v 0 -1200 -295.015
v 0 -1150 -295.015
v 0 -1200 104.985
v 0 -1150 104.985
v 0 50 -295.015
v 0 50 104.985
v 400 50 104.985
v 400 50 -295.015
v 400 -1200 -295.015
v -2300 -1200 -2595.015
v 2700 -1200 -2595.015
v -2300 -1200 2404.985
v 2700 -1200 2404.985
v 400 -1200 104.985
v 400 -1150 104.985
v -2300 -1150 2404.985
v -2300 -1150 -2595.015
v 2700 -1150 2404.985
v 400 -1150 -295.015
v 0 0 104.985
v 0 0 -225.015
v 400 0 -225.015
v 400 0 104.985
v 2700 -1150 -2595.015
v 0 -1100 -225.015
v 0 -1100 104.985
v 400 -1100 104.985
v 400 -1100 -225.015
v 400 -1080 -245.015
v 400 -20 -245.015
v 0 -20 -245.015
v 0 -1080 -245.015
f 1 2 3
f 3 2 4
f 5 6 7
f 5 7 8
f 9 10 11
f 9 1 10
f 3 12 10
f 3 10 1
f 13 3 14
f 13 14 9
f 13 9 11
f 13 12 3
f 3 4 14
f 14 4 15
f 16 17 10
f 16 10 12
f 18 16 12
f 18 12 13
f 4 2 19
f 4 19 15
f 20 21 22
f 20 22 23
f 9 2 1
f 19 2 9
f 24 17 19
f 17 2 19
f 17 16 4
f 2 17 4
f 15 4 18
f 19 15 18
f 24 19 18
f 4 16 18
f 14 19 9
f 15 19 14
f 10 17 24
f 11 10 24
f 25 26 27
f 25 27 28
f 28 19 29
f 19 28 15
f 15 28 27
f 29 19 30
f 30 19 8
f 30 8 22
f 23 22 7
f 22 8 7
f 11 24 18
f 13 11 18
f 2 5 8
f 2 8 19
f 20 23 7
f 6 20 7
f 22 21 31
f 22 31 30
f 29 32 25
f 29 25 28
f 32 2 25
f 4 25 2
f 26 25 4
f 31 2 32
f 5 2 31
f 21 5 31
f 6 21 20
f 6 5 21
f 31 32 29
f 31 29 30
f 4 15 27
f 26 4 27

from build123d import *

# Parameters (mm, degrees)
BOSS_EXTRUDE1_DEPTH = 400
CHAMFER1_SIZE       = 20
SKETCH2_W           = 5000
SKETCH2_H           = 5000
SKETCH2_W_2         = 400
SKETCH2_H_2         = 400
BOSS_EXTRUDE2_DEPTH = 50


with BuildPart() as part:
    # Sketch1 → Boss-Extrude1 (new body)
    with BuildSketch(Plane(origin=(0, 0, 0), x_dir=(0, 0, -1), z_dir=(1, 0, 0))):
        Polygon((-104.985169381, 50), (295.014830619, 50), (295.014830619, -1150), (-104.985169381, -1150), (-104.985169381, -1100), (245.014830619, -1100), (245.014830619, 0), (-104.985169381, 0), align=None)
    extrude(amount=BOSS_EXTRUDE1_DEPTH)

    # Chamfer1
    chamfer1_edges = [part.edges().sort_by_distance(p)[0] for p in [
        (200, -1100, -245.014830619),
        (200, 0, -245.014830619),
    ]]
    chamfer(chamfer1_edges, length=CHAMFER1_SIZE)


with BuildPart() as body_2:
    # Sketch2 → Boss-Extrude2 (new body)
    with BuildSketch(Plane.XZ.offset(1150)):
        with Locations((200, -95.014830619)):
            Rectangle(SKETCH2_W, SKETCH2_H)
        with Locations((200, -95.014830619)):
            Rectangle(SKETCH2_W_2, SKETCH2_H_2, mode=Mode.SUBTRACT)
    extrude(amount=BOSS_EXTRUDE2_DEPTH)


solid = Compound([part.part, body_2.part])
